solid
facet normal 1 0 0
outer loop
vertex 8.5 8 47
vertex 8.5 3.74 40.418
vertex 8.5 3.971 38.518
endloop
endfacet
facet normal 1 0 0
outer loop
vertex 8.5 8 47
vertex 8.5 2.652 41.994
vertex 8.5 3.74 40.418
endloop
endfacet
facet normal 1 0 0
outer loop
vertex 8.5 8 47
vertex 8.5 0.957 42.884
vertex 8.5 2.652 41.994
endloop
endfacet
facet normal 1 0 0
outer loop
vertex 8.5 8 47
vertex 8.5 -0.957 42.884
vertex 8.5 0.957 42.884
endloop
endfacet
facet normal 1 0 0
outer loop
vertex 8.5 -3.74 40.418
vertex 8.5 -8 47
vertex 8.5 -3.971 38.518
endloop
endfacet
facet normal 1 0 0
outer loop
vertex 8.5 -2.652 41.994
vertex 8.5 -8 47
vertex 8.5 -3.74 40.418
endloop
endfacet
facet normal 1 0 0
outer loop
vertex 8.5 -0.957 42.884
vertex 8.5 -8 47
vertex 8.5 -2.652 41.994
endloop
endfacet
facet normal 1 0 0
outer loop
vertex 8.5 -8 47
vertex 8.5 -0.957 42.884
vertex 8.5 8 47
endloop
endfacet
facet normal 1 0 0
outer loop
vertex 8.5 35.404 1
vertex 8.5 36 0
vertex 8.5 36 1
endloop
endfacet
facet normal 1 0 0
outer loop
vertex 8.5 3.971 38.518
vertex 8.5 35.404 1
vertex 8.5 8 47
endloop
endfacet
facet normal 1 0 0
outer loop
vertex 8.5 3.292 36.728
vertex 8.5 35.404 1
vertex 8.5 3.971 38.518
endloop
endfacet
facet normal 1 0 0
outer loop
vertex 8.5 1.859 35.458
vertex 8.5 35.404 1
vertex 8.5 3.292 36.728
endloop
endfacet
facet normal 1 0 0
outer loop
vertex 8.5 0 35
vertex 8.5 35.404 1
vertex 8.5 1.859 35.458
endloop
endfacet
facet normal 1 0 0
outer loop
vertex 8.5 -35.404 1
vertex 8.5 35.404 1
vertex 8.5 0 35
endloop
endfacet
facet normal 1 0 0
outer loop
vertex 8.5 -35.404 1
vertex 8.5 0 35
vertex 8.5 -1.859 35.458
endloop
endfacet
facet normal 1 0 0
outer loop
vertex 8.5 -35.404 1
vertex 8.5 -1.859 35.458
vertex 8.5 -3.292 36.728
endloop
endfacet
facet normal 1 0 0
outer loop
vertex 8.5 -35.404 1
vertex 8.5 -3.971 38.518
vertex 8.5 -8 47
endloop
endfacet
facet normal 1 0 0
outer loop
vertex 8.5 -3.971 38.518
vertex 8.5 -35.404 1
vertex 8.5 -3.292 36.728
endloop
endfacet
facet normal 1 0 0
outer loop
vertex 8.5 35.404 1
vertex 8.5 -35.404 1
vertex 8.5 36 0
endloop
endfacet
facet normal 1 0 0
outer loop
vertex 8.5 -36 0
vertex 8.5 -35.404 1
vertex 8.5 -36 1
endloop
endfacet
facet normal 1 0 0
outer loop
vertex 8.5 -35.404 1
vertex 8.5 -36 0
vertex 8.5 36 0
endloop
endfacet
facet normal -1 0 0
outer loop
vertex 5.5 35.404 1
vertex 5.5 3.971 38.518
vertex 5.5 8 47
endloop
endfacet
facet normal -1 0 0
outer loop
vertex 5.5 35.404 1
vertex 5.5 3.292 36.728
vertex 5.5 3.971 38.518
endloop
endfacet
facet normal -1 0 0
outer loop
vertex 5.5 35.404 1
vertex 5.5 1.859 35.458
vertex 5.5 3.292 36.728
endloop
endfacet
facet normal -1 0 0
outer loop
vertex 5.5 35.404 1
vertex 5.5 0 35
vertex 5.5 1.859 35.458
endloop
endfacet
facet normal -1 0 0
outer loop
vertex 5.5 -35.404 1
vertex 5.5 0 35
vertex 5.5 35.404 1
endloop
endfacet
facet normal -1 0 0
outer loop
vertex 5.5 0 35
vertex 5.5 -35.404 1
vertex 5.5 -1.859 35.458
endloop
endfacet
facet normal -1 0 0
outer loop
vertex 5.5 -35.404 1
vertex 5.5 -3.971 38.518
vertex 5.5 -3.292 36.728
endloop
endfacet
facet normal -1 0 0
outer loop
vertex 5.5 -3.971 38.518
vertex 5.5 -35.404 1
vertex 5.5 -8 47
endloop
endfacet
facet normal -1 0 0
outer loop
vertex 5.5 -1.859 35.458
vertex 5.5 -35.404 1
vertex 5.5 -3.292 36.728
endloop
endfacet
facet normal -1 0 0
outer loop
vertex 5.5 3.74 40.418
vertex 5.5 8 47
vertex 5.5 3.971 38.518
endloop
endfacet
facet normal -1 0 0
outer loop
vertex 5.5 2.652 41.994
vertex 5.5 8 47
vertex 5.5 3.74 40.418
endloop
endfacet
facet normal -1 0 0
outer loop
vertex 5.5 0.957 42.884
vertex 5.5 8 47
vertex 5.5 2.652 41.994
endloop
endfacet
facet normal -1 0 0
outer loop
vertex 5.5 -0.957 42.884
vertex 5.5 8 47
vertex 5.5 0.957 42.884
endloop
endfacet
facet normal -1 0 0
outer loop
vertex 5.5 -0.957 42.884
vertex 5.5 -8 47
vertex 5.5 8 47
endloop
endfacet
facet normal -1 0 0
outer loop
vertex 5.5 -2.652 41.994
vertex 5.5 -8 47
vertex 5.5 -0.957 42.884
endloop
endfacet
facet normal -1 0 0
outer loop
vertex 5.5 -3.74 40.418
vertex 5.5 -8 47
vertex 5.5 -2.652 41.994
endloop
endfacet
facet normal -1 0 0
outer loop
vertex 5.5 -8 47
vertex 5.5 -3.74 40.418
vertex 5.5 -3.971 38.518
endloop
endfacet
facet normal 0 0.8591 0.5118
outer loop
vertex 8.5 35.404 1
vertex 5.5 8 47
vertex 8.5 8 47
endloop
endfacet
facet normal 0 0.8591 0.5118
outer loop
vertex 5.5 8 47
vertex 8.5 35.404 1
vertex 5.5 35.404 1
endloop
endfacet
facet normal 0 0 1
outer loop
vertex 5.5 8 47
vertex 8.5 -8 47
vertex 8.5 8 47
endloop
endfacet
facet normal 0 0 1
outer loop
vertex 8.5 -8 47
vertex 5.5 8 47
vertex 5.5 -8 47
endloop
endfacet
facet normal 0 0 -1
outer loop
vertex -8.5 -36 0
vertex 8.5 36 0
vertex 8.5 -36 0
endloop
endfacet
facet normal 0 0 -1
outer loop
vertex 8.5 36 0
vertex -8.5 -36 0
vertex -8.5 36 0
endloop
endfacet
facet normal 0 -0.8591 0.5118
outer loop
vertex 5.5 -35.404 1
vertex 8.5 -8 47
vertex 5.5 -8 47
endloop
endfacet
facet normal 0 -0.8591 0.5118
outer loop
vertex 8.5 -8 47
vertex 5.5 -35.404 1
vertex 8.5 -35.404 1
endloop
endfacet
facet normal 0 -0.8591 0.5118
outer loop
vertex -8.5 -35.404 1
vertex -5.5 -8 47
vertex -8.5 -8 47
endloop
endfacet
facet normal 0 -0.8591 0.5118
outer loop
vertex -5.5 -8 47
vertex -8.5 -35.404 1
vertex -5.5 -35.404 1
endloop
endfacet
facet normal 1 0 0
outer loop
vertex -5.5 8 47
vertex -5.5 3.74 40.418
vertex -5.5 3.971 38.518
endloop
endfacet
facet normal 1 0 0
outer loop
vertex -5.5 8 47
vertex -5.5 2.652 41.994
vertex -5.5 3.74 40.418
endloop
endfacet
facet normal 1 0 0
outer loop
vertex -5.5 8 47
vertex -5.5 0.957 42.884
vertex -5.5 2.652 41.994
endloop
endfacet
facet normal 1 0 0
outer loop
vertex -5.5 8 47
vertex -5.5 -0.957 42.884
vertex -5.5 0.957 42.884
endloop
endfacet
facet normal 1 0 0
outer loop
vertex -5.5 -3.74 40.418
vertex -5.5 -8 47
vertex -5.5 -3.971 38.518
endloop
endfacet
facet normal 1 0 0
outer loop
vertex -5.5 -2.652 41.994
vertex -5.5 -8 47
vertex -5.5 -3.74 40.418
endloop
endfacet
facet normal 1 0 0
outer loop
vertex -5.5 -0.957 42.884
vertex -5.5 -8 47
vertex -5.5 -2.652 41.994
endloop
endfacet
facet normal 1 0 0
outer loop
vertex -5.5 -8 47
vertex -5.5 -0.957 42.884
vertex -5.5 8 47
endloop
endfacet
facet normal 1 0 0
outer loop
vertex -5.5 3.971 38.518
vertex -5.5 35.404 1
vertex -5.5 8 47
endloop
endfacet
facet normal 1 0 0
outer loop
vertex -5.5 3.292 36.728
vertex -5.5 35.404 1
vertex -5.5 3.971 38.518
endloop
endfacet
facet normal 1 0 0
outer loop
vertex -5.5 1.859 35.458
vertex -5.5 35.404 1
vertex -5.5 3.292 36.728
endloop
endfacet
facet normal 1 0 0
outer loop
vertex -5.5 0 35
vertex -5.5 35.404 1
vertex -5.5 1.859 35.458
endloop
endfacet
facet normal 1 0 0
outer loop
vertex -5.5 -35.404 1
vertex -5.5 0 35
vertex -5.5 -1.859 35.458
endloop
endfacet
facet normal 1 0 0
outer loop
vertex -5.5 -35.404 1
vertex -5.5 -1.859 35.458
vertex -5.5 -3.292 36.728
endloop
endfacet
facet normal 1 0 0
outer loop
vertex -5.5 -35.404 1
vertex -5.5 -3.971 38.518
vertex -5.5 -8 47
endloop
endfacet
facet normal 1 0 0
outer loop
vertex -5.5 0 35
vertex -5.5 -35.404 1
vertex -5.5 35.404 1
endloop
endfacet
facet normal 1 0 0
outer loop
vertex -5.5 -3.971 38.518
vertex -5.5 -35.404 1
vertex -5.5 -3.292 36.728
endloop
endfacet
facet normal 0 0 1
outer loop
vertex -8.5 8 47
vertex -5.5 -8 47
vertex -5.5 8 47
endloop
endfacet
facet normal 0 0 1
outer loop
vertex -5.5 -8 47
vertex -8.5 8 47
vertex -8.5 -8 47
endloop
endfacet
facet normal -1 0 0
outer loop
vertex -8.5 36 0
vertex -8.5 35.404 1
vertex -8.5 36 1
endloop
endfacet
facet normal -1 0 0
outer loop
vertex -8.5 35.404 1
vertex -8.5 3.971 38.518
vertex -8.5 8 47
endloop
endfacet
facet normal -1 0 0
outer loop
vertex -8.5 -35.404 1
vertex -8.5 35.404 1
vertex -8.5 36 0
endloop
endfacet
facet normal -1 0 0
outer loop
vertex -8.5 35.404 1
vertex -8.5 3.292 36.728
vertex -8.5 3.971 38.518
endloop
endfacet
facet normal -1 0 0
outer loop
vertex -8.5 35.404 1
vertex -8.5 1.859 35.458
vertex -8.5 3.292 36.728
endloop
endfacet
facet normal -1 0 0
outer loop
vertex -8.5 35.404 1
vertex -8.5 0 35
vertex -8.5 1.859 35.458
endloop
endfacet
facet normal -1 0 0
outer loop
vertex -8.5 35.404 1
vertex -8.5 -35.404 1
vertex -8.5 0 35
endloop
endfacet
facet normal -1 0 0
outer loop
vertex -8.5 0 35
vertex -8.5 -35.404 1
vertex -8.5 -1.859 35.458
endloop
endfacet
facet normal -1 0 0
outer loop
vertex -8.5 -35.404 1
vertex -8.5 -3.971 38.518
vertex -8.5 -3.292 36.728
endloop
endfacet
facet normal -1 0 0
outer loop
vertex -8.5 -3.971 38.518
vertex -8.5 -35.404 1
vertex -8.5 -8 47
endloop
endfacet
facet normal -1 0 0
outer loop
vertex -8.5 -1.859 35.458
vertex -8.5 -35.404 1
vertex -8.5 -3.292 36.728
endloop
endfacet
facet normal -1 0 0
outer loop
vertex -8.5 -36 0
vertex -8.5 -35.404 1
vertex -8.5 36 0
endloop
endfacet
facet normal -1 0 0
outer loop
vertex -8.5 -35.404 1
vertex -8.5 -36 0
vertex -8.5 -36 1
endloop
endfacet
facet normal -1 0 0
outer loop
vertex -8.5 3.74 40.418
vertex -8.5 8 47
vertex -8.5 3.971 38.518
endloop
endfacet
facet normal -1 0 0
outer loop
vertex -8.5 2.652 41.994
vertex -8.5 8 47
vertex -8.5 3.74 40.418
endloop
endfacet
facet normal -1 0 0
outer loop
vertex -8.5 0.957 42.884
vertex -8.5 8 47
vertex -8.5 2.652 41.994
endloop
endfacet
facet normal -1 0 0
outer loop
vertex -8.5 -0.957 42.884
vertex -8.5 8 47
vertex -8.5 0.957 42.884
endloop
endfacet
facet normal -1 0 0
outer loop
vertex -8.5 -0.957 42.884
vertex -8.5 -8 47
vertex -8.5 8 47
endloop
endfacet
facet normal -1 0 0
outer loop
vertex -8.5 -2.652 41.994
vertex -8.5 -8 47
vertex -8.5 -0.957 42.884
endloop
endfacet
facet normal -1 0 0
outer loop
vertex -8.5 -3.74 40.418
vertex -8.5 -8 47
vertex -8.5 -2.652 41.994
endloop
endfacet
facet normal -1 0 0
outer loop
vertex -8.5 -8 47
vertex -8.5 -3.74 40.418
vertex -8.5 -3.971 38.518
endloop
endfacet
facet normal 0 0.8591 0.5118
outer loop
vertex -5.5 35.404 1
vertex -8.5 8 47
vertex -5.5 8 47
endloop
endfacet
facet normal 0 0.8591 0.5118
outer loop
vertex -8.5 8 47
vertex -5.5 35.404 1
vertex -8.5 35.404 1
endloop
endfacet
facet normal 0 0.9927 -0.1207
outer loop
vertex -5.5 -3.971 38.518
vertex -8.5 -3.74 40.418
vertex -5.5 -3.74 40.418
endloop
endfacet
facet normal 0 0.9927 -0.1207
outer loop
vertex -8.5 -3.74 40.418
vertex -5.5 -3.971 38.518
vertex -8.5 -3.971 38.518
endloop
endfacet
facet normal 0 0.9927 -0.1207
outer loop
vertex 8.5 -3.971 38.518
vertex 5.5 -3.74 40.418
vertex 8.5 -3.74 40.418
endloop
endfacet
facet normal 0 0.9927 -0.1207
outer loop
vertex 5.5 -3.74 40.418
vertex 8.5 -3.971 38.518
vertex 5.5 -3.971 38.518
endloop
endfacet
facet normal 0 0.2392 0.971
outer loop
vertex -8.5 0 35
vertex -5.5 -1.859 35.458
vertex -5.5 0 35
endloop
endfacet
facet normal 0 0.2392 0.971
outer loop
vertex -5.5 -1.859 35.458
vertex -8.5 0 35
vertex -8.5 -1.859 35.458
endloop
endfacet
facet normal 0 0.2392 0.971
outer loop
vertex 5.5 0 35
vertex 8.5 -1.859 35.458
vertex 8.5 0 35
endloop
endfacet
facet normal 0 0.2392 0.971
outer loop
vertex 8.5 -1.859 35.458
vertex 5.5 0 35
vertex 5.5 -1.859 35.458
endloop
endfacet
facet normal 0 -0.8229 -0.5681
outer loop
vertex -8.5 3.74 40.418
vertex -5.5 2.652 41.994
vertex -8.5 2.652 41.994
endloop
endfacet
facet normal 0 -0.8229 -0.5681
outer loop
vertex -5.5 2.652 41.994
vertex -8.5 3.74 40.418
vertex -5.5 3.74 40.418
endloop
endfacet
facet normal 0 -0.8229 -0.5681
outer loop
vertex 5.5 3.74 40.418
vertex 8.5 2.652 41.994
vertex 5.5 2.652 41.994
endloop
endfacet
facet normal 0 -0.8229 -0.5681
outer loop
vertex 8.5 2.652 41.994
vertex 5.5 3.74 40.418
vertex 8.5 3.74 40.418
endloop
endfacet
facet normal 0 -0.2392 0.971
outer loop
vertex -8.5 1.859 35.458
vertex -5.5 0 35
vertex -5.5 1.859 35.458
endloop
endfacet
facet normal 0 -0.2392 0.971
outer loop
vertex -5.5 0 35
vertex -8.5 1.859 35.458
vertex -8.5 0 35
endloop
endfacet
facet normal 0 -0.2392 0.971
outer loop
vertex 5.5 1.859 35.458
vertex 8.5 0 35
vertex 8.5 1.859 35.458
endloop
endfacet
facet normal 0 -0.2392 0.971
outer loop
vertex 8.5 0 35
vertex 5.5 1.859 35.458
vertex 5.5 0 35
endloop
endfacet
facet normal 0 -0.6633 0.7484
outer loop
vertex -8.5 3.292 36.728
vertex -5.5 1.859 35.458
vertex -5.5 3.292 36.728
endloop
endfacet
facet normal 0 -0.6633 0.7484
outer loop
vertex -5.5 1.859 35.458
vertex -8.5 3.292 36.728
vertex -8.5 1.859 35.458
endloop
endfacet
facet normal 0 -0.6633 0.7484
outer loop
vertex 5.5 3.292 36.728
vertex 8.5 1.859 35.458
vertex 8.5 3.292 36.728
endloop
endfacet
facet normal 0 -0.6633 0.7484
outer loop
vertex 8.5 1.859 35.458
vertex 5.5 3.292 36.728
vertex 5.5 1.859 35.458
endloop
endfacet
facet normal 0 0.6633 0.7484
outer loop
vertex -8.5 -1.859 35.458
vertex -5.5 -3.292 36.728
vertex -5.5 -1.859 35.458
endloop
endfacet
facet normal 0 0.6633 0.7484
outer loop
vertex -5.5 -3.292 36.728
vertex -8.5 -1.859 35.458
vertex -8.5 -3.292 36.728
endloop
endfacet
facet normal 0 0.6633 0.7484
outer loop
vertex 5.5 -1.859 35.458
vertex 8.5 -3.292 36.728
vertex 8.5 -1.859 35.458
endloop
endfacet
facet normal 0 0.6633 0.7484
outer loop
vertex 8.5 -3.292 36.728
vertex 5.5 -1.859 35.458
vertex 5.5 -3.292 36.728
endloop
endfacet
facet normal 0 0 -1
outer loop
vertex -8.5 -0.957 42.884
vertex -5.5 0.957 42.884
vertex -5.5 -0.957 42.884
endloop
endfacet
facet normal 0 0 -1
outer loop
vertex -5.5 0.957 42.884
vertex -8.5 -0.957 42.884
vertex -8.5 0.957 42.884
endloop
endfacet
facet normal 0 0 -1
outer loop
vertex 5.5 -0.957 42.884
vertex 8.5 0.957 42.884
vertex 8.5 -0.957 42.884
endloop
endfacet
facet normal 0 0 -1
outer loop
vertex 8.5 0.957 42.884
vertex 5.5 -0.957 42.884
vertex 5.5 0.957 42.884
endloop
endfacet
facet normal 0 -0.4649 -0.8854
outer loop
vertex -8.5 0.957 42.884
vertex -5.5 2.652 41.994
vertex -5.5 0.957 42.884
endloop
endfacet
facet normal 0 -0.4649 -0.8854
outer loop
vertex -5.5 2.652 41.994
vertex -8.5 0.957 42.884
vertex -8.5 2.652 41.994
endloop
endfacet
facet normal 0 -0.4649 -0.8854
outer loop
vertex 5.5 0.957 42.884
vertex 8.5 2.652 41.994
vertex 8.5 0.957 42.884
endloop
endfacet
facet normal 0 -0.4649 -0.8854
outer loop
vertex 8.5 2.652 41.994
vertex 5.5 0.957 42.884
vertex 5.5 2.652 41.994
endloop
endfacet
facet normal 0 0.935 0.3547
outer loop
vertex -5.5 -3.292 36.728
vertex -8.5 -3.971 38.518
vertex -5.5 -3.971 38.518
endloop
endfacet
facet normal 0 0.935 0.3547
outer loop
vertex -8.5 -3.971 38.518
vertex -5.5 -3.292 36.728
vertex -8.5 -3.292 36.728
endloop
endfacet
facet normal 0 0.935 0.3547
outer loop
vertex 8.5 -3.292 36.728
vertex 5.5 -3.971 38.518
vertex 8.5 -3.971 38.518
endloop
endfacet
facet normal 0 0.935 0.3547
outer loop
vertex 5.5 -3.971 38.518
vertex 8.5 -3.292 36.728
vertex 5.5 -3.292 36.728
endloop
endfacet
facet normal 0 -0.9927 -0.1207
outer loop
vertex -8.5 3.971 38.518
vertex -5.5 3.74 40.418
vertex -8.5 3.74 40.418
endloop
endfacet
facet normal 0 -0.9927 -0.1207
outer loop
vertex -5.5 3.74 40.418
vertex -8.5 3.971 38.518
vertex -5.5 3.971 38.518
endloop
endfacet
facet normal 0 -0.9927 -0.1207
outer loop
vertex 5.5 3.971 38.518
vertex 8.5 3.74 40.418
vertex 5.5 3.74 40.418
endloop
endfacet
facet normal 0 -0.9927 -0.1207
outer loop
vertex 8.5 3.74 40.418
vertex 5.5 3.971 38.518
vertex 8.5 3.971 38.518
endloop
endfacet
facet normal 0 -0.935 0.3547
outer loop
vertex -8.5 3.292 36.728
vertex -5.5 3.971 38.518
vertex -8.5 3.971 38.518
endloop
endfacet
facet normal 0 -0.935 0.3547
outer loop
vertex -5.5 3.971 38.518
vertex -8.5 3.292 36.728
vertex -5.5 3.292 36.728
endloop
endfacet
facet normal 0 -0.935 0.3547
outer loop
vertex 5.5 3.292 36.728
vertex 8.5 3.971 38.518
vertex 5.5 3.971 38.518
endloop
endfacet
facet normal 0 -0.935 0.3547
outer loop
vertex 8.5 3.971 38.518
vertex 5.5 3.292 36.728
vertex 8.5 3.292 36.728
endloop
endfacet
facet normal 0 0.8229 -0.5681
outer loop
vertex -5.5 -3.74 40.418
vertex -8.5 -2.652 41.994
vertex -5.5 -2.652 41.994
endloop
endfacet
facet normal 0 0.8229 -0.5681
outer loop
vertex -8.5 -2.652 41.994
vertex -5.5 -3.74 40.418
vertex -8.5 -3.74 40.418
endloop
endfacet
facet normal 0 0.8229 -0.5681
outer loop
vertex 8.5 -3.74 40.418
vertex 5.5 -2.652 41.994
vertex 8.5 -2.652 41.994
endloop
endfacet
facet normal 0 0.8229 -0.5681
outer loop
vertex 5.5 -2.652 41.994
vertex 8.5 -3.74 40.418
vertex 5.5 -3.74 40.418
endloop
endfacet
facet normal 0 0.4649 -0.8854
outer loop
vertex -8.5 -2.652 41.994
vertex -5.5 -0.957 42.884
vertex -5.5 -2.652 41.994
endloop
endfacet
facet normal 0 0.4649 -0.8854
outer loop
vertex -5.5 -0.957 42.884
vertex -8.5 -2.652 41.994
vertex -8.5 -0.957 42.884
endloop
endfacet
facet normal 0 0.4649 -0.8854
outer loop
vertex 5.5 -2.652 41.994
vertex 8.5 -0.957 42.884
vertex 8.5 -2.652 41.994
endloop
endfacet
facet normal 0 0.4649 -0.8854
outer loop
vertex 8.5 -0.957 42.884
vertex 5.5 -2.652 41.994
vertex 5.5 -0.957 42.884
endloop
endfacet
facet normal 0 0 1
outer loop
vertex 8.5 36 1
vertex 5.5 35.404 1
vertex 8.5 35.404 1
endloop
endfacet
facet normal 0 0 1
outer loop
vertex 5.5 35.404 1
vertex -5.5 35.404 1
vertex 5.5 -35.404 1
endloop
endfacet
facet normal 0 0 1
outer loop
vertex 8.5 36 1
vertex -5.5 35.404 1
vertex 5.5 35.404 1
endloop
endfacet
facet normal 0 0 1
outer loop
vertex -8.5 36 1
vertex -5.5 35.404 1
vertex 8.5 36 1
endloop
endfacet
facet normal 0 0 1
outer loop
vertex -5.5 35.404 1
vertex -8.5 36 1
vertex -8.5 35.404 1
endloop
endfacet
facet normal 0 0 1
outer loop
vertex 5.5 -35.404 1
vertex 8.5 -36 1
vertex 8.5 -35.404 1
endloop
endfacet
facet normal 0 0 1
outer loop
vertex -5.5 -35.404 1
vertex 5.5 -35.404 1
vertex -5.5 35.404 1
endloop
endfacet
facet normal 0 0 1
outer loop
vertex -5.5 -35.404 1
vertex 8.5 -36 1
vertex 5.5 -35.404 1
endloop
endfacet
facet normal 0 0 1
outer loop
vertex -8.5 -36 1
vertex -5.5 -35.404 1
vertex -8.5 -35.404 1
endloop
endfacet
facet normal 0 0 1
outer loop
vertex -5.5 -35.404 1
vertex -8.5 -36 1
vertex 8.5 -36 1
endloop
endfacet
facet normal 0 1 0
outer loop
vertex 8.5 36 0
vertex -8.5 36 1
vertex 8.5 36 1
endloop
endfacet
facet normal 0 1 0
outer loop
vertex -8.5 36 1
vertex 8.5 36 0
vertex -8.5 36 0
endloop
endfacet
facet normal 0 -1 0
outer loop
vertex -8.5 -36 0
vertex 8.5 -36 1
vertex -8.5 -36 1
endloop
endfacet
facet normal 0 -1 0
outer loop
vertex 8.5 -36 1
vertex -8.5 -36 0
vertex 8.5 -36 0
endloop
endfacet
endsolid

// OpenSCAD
base_thickness=1;
horizontalspace=75;
wheel_thickness=5;
spacing_side=3;
spacing_bottom=3;
wheel_hole=8;
sidewall_thickness=3;
total_height=75;

wheel_diameter=total_height-spacing_bottom;
base_width=wheel_thickness+spacing_side*2+sidewall_thickness*2;
base_length=wheel_diameter;
union(){
	translate([0,0,base_thickness/2]) cube([base_width,base_length,base_thickness],center=true);
	difference(){
		for(i=[0,180]) rotate([0,0,i]) translate([base_width/2,0]) rotate([0,-90]) linear_extrude(height=sidewall_thickness) polygon([[0,-base_length/2],[0,base_length/2],[wheel_diameter/2+wheel_hole+spacing_bottom,wheel_hole],[wheel_diameter/2+wheel_hole+spacing_bottom,-wheel_hole]]);
		translate([0,0,spacing_bottom]){
//			cube([])
			translate([0,0,wheel_diameter/2]) rotate([0,90]){
				%cylinder(r=wheel_diameter/2,h=wheel_thickness,center=true);
				#cylinder(r=wheel_hole/2,h=100,center=true);
			}
		}
	}
}
echo("wheel_diameter",wheel_diameter);
echo("wheel_diameter",wheel_diameter);
